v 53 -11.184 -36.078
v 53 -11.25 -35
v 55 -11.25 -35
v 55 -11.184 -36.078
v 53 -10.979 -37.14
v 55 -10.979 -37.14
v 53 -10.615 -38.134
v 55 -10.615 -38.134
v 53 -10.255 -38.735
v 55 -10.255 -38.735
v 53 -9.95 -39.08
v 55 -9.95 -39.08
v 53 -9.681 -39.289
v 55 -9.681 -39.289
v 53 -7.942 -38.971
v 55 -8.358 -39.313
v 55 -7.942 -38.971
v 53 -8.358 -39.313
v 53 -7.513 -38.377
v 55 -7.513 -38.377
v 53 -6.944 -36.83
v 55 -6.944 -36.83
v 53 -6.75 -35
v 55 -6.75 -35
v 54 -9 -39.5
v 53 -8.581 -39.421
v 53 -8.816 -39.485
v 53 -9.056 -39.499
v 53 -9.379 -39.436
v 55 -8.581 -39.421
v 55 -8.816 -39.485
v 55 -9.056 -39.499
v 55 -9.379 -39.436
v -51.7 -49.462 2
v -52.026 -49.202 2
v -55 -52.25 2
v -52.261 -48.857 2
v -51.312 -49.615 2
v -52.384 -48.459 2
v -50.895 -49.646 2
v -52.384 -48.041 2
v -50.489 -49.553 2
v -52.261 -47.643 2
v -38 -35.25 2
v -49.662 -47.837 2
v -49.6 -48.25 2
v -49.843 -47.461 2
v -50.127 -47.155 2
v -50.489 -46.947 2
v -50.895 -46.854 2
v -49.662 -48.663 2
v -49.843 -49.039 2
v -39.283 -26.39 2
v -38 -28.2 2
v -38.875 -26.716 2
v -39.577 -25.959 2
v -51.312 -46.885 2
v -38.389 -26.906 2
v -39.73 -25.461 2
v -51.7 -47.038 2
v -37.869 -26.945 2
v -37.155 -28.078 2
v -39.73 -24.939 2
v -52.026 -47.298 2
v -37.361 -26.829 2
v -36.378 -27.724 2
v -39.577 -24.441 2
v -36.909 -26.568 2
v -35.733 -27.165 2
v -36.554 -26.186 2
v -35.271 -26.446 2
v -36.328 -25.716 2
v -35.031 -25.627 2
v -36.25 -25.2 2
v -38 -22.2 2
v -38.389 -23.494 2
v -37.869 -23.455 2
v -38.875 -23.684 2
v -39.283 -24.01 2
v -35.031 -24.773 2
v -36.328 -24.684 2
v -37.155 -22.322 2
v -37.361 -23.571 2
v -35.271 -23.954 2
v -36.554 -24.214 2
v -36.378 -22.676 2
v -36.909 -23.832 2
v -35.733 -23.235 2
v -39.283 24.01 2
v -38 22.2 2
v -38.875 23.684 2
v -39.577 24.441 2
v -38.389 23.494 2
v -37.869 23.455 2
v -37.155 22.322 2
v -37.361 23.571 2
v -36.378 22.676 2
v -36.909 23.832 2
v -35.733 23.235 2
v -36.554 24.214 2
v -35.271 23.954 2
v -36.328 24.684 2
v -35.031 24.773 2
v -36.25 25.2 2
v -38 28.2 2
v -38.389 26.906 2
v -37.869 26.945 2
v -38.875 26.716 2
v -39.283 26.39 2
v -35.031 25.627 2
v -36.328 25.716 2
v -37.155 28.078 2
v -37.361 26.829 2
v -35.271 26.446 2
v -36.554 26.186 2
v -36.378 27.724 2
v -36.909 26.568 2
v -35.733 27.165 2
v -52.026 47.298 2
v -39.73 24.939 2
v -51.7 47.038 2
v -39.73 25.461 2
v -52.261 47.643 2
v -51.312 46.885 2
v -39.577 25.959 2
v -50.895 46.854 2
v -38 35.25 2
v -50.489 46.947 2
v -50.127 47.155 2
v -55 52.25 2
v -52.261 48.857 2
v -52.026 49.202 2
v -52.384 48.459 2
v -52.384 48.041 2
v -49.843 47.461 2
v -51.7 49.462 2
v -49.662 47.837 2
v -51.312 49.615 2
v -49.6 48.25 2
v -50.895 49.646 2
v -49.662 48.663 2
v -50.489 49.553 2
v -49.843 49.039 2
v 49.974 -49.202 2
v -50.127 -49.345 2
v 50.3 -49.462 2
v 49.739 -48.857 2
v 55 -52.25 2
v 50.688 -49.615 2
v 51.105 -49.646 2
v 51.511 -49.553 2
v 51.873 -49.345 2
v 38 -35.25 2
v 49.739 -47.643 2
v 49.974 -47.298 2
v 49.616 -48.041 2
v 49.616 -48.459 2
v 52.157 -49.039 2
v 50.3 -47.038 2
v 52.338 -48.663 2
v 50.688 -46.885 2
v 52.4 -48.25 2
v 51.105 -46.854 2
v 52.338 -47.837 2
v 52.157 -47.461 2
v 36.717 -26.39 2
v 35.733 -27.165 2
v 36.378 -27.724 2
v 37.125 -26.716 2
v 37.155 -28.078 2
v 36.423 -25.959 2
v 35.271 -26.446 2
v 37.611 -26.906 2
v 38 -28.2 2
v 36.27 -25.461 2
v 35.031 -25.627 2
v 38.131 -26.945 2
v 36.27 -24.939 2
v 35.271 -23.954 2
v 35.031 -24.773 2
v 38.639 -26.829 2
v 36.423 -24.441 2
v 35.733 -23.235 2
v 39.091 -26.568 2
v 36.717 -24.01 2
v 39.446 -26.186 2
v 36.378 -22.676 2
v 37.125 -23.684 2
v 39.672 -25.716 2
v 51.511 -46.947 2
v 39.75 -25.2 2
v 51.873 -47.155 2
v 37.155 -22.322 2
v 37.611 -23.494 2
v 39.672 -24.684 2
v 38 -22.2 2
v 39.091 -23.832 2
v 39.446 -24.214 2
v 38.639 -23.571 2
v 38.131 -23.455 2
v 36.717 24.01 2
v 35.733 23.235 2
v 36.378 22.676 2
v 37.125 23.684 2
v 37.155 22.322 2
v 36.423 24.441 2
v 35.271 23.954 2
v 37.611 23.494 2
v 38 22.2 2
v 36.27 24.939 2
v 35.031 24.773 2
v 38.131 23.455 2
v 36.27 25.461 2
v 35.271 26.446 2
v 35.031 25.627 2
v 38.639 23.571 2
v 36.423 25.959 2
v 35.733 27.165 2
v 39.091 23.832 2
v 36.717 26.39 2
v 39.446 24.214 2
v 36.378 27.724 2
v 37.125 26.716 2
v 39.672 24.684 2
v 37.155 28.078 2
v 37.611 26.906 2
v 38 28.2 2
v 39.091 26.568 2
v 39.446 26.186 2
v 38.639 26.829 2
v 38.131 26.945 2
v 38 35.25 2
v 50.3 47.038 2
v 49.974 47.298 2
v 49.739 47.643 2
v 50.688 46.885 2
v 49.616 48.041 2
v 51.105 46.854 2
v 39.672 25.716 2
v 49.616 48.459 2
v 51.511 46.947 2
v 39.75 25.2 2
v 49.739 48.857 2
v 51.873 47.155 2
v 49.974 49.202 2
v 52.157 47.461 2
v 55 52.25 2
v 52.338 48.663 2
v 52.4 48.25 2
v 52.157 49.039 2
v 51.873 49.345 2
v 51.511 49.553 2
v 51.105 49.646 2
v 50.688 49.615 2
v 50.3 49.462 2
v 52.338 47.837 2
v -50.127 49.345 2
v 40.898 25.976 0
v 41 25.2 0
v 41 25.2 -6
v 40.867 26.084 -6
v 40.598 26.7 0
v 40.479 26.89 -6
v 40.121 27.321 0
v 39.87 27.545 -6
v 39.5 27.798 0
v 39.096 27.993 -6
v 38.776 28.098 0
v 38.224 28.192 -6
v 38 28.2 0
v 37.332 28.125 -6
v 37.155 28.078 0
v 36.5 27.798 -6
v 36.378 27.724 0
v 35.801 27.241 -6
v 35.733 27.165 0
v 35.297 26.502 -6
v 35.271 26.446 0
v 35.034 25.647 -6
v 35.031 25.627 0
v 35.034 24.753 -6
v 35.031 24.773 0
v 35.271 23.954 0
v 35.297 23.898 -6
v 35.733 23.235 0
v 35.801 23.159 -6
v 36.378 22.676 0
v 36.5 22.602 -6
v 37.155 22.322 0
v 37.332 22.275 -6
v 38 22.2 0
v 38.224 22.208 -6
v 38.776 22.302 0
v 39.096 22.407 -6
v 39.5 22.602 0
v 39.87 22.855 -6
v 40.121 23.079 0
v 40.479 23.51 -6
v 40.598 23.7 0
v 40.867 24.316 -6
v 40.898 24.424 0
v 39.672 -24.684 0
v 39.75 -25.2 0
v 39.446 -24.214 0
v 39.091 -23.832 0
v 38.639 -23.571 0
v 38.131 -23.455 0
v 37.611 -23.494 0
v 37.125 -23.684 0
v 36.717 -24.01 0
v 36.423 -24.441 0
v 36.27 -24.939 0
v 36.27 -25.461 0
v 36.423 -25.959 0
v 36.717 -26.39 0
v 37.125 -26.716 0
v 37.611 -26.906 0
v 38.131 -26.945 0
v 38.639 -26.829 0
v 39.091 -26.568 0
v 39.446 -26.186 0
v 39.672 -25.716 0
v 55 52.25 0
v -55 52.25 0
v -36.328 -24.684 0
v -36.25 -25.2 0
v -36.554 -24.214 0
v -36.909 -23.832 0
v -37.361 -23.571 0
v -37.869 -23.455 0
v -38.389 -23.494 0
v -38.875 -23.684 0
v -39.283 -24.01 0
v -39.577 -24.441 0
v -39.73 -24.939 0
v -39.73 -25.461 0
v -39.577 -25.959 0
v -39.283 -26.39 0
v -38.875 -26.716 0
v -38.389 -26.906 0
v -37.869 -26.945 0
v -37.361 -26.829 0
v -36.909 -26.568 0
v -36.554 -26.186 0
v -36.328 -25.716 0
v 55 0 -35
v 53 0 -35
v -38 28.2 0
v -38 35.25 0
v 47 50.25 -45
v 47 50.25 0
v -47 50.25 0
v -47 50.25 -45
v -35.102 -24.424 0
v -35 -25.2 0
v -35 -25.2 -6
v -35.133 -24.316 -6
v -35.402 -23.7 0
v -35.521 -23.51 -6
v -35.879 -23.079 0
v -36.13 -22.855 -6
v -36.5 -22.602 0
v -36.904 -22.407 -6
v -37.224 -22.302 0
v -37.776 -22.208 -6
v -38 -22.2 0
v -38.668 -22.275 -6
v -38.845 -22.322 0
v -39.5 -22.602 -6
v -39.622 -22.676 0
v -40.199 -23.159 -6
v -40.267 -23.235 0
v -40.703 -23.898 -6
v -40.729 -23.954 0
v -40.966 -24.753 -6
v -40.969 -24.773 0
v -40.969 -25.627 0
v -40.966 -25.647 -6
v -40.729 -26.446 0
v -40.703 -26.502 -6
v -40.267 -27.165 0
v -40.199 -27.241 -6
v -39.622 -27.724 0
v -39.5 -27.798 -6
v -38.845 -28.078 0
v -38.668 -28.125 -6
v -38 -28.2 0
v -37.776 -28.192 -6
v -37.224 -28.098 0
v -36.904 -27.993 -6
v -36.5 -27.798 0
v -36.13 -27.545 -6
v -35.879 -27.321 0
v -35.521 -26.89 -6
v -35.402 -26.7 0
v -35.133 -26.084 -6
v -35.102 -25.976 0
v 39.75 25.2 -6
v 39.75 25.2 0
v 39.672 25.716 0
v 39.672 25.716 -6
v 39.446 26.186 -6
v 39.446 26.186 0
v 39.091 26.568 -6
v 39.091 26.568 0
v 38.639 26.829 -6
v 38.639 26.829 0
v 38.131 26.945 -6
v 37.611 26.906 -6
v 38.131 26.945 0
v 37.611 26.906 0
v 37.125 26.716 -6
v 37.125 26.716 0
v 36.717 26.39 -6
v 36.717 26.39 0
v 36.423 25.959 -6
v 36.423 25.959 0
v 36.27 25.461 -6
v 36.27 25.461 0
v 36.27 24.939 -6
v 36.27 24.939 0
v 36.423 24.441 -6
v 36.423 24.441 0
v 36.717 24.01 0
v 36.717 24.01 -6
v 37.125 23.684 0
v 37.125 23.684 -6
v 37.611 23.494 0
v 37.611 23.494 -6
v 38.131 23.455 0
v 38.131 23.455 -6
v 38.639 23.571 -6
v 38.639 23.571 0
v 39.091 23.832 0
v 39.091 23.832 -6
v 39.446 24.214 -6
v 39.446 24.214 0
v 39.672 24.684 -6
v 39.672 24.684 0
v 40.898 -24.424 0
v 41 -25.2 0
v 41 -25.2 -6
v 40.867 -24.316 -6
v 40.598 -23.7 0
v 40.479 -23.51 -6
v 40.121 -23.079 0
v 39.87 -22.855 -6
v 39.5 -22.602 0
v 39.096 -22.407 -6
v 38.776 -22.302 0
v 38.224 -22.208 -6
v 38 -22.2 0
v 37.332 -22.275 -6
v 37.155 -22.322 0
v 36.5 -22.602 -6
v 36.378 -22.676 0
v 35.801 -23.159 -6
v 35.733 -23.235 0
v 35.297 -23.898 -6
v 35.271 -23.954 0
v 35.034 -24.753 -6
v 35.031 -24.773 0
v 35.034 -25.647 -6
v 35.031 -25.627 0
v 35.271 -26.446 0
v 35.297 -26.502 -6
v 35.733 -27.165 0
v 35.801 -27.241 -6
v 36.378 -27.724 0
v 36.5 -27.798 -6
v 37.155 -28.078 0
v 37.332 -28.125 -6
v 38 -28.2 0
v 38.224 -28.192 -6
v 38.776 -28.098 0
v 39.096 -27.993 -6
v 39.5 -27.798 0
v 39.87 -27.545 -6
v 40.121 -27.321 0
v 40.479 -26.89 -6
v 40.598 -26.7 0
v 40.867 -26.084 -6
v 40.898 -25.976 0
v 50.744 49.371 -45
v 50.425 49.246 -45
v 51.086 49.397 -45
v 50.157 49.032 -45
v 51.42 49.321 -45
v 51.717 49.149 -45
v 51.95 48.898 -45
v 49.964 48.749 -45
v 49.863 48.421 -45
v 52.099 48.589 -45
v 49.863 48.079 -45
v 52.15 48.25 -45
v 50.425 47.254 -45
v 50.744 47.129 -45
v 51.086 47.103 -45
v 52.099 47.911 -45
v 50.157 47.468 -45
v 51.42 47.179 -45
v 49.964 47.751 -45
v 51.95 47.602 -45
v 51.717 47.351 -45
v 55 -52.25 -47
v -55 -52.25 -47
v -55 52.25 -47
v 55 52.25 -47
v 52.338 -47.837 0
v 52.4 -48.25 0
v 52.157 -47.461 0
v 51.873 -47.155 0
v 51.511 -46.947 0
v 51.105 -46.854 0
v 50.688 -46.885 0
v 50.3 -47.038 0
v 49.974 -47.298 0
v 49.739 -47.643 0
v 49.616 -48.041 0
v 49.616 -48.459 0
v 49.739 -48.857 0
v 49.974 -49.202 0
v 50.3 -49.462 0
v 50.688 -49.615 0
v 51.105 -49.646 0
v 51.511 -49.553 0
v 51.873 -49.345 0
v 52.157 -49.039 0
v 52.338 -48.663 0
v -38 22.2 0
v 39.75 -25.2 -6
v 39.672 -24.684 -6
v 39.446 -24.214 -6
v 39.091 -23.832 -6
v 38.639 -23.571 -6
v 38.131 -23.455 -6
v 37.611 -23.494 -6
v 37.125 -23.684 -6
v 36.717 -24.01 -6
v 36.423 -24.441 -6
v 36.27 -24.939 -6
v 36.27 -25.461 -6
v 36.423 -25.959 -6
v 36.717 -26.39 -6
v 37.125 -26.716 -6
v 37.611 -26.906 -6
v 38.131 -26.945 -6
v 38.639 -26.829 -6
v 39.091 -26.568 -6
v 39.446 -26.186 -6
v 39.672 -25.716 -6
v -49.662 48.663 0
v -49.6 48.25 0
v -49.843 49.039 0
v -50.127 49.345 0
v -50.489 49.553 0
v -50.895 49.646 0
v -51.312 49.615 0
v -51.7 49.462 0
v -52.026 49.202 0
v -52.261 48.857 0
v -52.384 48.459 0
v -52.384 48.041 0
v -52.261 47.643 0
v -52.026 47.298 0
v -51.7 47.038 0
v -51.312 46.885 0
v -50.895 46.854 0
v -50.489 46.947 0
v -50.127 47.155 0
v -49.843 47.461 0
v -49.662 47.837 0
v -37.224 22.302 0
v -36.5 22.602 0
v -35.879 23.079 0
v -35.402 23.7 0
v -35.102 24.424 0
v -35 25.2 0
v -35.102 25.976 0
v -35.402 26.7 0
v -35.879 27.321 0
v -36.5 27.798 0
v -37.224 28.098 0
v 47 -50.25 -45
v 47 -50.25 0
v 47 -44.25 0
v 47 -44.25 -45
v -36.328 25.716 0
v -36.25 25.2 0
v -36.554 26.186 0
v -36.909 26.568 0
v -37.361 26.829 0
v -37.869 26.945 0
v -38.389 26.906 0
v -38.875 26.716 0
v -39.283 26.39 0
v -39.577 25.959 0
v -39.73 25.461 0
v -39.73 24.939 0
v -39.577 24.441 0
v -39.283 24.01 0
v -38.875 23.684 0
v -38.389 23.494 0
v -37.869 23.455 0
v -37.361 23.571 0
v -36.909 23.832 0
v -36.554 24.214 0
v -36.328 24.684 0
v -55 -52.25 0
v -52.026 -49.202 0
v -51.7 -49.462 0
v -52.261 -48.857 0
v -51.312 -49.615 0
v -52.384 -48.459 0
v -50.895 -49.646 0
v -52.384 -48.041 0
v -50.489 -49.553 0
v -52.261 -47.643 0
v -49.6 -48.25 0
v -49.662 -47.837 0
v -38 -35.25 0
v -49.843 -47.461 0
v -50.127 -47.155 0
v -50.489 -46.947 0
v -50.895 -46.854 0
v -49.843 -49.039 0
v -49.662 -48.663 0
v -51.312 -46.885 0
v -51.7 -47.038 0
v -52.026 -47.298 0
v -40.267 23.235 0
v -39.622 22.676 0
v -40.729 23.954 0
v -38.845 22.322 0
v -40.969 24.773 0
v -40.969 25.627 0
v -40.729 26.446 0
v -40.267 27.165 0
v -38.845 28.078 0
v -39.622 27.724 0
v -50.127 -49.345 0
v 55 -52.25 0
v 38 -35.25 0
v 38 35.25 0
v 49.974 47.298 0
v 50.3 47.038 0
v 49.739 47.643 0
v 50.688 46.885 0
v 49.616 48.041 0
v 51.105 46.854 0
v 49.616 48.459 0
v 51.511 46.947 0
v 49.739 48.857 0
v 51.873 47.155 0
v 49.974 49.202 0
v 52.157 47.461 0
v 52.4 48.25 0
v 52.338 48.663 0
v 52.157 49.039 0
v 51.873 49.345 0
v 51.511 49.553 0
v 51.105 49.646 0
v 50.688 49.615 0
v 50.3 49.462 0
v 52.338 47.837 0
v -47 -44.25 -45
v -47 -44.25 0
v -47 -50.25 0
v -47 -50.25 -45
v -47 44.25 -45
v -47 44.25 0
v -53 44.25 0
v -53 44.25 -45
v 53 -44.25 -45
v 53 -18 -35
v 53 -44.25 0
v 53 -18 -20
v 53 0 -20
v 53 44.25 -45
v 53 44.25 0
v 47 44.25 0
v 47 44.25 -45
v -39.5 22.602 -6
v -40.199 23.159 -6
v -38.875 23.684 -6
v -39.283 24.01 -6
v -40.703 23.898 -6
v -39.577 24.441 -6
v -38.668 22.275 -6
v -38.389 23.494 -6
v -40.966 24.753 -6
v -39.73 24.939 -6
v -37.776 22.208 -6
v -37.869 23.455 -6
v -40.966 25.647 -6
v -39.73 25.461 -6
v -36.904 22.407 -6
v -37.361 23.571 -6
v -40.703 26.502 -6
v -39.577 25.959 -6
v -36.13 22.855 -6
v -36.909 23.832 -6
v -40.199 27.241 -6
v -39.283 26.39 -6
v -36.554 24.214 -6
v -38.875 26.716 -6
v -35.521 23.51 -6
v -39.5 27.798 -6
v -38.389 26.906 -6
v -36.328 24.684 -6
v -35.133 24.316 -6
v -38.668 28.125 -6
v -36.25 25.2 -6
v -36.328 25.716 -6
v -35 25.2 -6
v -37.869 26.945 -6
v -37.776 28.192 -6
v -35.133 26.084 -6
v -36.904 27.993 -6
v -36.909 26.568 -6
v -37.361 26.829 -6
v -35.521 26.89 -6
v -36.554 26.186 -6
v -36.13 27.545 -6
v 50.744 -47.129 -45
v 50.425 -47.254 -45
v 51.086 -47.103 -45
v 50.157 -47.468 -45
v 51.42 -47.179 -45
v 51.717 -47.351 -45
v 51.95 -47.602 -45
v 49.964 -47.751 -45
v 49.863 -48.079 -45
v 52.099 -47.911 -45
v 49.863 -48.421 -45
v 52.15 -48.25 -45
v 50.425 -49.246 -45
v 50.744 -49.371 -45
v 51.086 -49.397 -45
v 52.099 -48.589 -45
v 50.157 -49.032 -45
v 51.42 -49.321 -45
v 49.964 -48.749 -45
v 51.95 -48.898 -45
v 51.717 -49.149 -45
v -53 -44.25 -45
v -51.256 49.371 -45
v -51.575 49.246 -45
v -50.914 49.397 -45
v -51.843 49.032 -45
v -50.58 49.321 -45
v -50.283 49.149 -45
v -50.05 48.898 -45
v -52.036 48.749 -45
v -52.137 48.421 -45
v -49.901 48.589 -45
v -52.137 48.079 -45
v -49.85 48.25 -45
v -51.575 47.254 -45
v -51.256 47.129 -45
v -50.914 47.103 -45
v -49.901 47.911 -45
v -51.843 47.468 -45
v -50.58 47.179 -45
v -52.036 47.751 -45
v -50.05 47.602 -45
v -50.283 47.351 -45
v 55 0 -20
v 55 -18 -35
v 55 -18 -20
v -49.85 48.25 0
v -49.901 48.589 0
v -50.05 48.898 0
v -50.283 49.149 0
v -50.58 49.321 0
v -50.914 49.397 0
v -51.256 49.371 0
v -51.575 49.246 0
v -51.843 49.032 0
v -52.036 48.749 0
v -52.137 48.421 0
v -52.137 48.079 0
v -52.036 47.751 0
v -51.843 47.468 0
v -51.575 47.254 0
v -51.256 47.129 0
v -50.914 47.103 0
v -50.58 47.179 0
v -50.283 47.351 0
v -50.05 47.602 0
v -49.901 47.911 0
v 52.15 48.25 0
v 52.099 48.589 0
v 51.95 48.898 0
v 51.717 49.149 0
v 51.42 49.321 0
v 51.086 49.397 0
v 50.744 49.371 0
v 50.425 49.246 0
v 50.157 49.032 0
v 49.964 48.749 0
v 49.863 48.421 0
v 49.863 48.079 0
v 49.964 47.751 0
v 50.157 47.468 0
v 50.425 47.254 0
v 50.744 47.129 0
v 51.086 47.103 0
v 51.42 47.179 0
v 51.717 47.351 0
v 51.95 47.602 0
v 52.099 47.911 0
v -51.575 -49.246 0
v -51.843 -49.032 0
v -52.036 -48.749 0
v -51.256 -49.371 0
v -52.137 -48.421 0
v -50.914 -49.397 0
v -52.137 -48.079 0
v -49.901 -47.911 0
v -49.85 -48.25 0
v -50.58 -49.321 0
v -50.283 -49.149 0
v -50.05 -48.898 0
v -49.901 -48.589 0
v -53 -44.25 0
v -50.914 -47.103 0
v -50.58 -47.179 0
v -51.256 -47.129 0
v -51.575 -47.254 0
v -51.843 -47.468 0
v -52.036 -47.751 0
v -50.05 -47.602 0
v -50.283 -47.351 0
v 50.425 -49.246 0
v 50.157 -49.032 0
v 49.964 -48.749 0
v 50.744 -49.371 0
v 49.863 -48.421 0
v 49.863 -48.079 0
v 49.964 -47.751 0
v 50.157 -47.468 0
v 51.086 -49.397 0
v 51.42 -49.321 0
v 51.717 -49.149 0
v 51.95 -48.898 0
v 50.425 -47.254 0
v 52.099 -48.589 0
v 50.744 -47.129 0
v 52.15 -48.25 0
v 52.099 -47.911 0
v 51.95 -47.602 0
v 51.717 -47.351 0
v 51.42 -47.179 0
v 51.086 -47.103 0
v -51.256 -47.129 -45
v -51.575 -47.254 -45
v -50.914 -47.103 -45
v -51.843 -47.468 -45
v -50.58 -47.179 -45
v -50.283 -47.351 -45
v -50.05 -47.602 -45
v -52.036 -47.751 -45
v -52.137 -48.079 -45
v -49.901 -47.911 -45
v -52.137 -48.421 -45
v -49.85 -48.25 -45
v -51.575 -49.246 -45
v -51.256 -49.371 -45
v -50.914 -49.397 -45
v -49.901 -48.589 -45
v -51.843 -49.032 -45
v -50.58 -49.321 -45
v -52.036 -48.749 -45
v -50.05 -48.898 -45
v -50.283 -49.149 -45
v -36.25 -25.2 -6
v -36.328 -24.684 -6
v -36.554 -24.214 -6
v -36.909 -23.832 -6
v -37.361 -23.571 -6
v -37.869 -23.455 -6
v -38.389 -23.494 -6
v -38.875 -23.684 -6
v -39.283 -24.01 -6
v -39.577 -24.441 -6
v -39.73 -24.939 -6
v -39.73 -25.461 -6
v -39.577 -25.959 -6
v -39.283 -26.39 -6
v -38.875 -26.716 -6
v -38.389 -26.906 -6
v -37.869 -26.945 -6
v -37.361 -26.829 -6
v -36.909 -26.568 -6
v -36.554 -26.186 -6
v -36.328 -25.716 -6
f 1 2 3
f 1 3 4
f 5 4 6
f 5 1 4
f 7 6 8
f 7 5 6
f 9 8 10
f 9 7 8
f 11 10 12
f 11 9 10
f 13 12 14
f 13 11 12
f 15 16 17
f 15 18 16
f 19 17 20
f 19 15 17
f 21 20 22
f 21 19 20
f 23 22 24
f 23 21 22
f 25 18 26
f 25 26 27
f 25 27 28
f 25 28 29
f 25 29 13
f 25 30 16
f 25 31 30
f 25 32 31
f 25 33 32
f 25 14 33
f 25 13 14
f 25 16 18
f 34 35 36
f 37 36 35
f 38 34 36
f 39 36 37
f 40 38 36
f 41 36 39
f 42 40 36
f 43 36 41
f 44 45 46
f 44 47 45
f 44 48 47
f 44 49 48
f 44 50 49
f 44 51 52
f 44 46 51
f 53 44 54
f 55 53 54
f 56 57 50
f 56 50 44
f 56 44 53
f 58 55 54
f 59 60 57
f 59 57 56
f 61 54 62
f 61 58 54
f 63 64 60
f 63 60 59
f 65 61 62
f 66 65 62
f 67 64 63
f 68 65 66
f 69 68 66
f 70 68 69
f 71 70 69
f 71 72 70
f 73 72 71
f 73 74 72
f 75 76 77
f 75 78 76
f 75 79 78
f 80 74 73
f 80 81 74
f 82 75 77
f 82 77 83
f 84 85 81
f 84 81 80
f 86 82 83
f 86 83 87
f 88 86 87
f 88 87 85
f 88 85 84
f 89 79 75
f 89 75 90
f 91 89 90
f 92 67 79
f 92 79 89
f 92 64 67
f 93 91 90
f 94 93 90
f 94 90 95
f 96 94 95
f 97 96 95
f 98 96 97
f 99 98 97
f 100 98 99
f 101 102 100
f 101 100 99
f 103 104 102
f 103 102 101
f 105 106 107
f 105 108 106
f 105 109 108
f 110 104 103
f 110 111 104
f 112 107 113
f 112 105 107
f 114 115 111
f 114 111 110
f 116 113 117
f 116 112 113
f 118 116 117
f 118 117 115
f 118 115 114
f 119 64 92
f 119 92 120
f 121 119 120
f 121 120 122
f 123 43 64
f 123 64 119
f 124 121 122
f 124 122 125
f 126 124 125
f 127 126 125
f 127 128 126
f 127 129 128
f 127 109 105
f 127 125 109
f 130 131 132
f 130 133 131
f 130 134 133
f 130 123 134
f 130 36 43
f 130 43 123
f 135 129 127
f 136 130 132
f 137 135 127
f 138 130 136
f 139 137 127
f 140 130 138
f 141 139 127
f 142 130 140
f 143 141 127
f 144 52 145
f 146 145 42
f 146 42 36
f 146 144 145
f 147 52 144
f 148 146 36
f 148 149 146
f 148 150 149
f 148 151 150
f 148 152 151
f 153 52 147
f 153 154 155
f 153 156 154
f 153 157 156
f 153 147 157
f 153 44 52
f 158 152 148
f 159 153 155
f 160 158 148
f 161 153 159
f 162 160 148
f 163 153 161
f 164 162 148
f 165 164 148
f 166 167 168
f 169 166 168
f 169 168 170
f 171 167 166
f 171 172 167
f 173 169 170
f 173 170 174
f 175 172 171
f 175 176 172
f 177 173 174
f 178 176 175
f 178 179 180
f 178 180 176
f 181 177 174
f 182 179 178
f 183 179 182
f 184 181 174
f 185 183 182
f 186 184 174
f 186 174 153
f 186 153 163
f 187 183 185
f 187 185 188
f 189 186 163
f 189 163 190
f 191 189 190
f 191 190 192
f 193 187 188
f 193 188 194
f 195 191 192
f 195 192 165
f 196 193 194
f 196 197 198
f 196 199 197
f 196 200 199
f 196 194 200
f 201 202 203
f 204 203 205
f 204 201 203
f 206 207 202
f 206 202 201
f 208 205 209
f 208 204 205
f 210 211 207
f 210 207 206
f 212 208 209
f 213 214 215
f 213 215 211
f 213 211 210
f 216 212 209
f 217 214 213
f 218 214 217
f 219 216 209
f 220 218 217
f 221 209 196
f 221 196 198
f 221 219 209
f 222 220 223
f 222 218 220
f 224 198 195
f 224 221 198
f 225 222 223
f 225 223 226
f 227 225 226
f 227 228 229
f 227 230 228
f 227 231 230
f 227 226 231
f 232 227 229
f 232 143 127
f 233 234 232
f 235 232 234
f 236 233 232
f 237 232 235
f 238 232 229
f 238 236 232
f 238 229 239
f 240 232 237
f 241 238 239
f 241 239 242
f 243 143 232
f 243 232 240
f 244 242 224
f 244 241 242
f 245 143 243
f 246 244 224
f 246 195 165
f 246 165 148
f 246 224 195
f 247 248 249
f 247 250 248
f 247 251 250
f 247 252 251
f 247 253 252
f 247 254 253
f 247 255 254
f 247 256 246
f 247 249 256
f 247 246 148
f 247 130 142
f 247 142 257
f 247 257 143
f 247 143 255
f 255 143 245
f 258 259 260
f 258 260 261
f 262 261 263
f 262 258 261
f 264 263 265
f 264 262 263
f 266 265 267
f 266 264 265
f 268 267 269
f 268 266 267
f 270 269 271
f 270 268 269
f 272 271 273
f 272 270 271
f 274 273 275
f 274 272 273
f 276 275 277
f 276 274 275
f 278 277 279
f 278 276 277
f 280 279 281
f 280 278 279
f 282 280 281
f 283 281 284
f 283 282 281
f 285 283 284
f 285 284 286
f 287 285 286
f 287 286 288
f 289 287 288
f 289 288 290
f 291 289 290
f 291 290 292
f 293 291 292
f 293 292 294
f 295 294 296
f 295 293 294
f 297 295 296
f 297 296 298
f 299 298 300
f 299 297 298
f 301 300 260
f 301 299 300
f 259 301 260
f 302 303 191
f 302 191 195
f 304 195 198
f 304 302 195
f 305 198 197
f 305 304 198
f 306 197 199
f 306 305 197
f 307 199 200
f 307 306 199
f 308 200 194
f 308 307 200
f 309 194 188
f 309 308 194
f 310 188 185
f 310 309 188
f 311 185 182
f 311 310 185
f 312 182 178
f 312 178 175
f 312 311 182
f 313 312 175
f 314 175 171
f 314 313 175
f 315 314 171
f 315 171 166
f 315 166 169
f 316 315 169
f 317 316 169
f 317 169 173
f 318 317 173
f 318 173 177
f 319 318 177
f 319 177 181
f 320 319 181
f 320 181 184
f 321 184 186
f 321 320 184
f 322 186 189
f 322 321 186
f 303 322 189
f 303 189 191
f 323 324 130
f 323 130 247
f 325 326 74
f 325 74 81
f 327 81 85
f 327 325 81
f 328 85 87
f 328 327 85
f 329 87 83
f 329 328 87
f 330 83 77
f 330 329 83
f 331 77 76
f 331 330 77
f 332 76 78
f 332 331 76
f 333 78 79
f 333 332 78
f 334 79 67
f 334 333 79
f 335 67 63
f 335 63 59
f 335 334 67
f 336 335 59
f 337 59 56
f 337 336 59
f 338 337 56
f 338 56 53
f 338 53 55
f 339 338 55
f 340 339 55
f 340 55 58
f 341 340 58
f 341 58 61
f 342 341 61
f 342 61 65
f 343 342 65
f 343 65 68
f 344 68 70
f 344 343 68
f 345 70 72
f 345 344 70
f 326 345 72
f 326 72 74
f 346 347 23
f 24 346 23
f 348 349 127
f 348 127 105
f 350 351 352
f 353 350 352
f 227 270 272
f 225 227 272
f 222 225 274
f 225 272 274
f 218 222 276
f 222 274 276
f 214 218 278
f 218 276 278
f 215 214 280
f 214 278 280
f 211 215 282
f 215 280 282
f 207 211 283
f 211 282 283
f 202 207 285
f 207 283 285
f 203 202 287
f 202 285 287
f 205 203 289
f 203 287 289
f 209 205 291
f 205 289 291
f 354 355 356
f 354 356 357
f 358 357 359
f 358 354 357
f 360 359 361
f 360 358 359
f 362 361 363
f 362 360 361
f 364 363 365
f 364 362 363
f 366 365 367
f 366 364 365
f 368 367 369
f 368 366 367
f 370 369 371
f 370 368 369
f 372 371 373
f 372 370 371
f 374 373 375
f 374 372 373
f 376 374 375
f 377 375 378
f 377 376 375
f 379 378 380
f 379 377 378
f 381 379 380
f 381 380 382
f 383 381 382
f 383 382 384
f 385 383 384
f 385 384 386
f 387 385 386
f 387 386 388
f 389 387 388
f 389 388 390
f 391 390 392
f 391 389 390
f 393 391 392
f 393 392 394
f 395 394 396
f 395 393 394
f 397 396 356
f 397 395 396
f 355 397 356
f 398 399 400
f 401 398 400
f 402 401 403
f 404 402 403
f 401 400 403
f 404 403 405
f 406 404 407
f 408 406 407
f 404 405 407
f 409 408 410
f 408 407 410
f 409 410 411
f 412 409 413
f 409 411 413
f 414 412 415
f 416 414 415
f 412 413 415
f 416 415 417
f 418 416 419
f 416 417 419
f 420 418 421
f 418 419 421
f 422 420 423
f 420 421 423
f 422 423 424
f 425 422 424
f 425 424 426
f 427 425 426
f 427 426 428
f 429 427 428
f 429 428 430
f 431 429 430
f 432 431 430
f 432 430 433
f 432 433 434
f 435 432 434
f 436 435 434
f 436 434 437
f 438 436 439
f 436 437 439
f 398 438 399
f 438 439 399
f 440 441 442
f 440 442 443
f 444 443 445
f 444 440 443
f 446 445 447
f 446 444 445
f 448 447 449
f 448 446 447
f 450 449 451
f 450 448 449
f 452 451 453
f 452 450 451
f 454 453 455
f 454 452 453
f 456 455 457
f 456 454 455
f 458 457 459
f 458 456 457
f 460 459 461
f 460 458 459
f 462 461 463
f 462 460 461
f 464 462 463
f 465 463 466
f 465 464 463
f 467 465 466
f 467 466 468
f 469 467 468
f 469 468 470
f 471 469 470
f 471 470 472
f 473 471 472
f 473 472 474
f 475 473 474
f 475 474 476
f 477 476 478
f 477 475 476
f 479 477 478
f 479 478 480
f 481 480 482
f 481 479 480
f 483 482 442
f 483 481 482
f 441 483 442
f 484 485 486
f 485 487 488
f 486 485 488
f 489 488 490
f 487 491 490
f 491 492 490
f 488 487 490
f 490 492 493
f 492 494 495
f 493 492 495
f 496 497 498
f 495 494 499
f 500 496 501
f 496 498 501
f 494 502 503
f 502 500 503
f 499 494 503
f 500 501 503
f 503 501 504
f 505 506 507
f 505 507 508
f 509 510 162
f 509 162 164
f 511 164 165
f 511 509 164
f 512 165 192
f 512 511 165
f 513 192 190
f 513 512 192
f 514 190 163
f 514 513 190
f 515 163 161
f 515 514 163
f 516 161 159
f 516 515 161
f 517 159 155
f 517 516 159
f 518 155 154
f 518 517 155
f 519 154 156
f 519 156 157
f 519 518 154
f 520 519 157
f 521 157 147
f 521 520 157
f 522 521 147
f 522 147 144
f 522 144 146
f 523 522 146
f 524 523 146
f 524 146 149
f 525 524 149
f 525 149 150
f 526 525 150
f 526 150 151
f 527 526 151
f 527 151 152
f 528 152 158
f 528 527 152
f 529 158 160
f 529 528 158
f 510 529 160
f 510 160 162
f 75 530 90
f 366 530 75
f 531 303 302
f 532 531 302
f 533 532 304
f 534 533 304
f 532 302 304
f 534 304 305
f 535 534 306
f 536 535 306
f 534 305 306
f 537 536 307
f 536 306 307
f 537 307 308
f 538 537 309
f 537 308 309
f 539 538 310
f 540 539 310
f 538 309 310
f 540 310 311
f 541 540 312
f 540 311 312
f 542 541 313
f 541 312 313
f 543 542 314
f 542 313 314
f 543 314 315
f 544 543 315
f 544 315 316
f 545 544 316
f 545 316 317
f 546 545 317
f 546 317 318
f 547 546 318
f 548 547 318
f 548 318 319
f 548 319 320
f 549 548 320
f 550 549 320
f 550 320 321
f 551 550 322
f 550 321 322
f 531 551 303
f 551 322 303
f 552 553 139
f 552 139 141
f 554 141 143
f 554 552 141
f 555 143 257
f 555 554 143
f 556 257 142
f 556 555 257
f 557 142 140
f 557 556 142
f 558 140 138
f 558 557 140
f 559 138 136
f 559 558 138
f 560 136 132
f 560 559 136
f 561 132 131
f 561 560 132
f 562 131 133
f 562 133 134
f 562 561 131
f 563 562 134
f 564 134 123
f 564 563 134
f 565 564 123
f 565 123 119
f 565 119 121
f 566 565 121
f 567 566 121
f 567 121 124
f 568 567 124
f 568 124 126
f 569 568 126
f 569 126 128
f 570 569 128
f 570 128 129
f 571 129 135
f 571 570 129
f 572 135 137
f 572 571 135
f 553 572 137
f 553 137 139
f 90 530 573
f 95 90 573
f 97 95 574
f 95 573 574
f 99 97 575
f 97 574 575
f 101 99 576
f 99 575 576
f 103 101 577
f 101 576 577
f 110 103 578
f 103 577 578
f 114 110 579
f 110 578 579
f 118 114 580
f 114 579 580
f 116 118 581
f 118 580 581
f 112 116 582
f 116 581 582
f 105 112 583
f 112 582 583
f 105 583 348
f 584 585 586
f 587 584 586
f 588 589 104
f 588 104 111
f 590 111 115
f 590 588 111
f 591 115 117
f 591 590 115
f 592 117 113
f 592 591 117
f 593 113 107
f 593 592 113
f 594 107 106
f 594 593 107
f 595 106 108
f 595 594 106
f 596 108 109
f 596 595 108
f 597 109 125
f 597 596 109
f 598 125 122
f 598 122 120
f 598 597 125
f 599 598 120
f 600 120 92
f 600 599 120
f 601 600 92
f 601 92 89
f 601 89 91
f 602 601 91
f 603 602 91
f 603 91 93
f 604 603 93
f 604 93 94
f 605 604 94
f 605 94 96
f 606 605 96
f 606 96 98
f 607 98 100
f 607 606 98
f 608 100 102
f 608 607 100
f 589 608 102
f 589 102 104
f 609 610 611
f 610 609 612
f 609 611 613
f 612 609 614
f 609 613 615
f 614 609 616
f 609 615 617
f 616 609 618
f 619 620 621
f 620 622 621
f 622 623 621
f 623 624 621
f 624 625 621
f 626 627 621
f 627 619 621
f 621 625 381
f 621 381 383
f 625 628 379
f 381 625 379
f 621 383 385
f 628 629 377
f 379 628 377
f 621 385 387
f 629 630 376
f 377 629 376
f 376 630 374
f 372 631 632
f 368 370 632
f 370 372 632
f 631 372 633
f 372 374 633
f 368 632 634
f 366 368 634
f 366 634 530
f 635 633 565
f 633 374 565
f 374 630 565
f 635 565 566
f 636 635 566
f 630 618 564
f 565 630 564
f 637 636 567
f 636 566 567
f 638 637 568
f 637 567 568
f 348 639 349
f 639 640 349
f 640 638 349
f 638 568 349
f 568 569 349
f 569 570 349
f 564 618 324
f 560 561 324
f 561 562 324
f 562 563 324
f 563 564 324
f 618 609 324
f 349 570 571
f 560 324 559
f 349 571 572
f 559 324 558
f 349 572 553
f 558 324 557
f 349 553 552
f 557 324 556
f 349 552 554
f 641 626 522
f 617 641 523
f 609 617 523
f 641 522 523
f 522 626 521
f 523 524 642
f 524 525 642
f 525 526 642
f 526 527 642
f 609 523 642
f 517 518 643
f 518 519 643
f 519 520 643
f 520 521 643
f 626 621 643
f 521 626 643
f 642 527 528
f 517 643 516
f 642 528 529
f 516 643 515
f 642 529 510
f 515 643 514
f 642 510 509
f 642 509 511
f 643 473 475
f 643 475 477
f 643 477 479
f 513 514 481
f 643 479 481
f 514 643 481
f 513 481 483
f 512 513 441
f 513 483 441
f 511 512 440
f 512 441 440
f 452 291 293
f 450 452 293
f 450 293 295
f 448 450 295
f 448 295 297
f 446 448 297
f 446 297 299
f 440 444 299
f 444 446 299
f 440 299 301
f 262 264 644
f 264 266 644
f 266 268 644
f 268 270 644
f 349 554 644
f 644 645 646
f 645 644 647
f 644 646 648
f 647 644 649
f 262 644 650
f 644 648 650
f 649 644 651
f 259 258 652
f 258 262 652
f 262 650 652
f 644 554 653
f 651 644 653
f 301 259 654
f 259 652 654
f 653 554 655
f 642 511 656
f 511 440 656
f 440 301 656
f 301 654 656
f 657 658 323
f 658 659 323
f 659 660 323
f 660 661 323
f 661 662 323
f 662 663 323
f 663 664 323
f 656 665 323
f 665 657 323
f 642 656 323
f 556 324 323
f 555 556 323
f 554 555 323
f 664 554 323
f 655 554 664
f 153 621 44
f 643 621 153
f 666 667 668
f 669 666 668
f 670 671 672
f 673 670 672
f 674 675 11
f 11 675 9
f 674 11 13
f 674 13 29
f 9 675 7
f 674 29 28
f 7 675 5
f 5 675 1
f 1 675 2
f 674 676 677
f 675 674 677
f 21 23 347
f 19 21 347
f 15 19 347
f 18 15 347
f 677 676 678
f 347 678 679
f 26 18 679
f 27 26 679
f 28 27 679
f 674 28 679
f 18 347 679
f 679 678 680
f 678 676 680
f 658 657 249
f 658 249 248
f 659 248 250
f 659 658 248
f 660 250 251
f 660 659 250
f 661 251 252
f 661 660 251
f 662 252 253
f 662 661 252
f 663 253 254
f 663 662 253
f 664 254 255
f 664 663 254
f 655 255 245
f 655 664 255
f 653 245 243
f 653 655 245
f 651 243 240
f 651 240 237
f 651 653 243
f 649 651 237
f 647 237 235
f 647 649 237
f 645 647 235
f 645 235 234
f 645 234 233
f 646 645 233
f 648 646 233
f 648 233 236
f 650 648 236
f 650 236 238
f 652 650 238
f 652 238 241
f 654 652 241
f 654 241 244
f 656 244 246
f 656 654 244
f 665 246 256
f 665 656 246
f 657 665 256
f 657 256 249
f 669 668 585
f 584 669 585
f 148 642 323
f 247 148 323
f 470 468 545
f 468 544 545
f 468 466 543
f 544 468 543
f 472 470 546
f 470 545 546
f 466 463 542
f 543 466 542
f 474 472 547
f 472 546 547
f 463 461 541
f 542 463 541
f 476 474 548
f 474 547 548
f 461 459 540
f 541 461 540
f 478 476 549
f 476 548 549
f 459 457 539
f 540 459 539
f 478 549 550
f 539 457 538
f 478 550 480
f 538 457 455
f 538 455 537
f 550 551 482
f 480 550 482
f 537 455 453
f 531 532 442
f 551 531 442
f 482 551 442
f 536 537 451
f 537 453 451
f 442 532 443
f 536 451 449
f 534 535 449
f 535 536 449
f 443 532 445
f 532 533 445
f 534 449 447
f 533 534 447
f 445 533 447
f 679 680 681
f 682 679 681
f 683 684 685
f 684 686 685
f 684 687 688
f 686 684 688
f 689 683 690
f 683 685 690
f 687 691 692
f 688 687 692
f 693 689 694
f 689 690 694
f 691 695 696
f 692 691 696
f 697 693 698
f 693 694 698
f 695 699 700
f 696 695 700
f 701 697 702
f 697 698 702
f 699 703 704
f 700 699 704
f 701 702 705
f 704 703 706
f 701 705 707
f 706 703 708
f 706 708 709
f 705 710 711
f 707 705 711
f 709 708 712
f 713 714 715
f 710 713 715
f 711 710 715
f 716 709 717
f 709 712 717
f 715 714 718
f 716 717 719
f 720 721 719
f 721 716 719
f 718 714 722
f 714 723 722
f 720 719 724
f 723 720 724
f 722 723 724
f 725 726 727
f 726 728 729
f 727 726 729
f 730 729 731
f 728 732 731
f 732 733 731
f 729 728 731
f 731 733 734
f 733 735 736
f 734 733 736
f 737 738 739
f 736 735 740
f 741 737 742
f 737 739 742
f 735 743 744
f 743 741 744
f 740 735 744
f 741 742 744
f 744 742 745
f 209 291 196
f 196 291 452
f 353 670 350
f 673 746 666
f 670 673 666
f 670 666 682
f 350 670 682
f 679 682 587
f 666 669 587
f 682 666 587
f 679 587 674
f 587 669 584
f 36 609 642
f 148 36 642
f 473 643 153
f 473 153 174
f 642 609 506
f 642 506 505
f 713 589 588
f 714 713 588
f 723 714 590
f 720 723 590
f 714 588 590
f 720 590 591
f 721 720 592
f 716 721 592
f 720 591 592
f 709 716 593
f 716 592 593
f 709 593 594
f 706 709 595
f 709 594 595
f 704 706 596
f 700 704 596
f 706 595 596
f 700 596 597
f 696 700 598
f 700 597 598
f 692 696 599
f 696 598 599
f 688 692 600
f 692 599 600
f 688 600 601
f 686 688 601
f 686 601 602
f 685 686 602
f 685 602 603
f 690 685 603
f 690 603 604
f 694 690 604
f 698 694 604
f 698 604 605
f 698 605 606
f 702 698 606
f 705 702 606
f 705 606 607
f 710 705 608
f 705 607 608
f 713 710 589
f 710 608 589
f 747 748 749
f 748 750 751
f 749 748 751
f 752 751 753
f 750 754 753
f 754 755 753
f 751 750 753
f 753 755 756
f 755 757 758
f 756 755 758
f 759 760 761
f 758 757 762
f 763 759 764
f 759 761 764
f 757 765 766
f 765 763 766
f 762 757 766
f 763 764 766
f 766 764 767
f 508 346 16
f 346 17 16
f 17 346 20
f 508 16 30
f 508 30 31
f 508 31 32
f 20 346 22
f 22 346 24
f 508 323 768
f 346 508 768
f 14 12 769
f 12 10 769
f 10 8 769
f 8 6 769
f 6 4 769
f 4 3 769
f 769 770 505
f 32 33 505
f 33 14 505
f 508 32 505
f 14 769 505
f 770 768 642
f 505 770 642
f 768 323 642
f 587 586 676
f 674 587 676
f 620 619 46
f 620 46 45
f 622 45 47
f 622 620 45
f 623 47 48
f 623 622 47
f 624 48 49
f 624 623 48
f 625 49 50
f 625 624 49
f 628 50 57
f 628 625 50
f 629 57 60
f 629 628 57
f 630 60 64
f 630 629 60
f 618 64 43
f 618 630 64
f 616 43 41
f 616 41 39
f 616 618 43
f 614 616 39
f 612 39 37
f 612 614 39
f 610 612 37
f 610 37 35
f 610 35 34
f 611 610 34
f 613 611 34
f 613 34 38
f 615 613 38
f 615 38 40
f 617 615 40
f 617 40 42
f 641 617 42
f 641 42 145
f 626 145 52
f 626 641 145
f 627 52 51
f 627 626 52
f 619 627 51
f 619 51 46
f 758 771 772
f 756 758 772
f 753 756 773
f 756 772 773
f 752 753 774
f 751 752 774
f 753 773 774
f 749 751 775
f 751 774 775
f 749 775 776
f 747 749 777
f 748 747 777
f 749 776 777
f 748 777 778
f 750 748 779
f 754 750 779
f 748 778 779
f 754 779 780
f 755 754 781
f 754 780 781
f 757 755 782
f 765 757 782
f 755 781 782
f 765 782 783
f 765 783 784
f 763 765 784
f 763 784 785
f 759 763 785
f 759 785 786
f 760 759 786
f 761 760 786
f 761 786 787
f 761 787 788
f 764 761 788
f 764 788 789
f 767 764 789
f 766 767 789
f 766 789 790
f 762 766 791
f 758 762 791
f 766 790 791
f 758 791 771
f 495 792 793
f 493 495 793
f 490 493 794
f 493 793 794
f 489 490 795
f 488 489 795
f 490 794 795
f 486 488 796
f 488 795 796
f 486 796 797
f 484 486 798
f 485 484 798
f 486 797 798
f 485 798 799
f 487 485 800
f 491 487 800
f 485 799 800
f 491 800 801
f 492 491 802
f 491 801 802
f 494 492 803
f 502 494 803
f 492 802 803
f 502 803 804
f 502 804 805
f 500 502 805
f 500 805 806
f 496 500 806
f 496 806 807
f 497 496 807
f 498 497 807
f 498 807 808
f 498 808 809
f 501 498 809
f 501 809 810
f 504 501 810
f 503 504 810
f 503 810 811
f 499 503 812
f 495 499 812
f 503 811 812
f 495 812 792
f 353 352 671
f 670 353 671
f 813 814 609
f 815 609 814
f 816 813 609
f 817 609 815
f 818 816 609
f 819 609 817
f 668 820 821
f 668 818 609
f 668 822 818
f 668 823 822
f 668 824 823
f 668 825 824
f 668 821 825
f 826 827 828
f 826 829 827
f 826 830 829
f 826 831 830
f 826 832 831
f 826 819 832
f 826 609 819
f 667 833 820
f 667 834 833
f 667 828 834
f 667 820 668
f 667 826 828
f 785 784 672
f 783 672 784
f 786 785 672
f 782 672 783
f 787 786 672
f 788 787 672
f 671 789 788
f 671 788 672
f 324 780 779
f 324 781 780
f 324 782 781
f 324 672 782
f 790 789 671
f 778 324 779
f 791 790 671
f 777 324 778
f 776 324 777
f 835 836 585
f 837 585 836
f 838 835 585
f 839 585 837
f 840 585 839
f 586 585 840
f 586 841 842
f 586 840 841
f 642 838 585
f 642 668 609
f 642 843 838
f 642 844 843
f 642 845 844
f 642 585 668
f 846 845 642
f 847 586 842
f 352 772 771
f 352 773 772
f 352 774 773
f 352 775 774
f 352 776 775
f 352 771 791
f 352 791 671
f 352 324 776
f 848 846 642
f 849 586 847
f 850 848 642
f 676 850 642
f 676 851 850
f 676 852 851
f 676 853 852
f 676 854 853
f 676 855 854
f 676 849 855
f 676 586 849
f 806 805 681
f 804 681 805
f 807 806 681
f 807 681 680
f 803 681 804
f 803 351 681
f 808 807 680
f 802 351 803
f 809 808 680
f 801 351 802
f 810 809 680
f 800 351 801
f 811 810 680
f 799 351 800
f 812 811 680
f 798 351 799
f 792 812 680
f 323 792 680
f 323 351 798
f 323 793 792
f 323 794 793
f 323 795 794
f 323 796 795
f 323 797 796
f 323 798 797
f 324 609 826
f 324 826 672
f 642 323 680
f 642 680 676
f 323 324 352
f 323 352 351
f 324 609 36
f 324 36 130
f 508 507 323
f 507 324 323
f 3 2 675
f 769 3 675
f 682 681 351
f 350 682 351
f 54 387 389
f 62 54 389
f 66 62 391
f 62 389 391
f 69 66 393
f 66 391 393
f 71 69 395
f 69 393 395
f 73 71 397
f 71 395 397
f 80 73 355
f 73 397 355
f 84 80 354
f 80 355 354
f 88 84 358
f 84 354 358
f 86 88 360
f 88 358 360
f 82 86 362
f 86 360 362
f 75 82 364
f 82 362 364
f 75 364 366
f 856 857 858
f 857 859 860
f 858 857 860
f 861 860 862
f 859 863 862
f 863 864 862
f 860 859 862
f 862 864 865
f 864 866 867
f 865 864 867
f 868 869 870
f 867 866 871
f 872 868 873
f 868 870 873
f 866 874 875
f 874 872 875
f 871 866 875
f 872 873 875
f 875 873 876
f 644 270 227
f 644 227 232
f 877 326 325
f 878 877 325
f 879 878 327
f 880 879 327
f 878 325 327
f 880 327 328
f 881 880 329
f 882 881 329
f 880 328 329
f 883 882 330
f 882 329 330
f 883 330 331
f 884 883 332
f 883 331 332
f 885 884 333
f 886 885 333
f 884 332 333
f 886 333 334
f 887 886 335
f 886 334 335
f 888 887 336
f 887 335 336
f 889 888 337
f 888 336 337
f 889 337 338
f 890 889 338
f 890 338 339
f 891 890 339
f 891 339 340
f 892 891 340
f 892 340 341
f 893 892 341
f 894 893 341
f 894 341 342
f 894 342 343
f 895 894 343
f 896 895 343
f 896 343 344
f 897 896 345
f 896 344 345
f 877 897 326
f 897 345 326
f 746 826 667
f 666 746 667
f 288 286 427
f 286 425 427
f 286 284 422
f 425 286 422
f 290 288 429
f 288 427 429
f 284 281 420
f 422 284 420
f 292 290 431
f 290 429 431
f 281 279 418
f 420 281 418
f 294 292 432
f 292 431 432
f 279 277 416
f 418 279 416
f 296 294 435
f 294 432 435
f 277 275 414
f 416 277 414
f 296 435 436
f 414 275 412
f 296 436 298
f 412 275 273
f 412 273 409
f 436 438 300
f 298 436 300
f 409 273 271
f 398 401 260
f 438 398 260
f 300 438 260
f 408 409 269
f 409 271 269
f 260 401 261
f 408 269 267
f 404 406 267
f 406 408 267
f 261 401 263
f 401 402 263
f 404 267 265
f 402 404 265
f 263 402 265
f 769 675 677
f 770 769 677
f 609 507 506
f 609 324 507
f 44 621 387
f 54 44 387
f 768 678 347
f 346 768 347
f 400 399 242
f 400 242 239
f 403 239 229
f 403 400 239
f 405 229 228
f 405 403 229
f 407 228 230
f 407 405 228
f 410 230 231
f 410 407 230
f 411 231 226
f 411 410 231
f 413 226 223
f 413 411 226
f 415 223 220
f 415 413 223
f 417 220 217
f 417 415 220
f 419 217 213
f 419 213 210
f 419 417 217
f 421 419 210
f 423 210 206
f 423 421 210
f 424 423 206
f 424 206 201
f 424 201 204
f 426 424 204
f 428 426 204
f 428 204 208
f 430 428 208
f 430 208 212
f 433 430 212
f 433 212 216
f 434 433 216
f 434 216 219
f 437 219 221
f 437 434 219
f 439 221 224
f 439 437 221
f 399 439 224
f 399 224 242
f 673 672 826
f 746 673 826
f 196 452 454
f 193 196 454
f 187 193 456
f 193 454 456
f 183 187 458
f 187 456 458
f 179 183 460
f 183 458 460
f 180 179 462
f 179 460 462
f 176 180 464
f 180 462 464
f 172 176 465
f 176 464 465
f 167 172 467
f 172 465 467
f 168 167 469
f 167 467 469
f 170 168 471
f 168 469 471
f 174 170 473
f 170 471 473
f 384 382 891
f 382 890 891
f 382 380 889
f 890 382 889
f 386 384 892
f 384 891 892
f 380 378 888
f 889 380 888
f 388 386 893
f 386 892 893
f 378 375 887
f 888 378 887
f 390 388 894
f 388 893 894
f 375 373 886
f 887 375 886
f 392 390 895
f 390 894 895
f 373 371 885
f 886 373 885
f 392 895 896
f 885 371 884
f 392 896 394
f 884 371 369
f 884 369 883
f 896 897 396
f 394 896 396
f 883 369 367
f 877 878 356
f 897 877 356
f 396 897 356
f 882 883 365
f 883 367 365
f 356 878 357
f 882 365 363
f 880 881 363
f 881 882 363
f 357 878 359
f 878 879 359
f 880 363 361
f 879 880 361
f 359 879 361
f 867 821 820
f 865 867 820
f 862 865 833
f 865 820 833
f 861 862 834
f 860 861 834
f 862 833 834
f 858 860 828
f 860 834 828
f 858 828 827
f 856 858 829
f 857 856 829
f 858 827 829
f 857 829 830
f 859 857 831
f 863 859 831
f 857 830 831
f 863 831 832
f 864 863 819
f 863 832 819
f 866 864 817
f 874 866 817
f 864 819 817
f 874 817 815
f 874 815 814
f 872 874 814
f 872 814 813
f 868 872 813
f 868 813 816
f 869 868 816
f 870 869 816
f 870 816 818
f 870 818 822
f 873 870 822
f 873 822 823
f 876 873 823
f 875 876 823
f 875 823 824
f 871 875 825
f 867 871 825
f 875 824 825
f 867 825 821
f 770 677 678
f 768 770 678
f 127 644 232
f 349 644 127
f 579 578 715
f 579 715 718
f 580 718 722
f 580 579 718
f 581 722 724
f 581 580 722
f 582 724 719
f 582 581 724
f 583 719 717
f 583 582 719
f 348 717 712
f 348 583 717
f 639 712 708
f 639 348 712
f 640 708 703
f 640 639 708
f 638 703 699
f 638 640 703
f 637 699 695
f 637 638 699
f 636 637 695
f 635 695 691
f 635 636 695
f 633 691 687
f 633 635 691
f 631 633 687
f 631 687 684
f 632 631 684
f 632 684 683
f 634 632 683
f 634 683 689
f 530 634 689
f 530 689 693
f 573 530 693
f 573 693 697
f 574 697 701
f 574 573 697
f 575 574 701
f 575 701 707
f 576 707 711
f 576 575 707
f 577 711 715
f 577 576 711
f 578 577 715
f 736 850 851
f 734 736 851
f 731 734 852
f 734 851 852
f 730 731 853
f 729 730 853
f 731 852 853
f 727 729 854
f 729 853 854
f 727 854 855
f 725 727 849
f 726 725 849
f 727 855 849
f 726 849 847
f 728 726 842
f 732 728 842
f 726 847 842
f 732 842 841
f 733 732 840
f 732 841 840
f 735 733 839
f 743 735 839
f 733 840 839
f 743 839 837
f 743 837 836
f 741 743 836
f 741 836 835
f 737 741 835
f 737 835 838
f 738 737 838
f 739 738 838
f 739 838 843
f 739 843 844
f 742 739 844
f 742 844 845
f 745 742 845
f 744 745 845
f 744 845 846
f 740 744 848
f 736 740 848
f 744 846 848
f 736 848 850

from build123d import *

# Parameters (mm, degrees)
SKETCH_W      = 110
SKETCH_H      = 104.5
SKETCH_R      = 1.75
SKETCH_R_2    = 1.4
PAD_DEPTH     = 2
SKETCH001_R   = 3
SKETCH001_R_2 = 1.75
PAD001_DEPTH  = 6
SKETCH002_W   = 110
SKETCH002_H   = 104.5
SKETCH002_R   = 1.15
PAD002_DEPTH  = 45
SKETCH003_W   = 110
SKETCH003_H   = 104.5
PAD003_DEPTH  = 2
POCKET_DEPTH  = 55.001


with BuildPart() as faceplate:
    # Sketch → Pad (new body)
    with BuildSketch(Plane.XY):
        Rectangle(SKETCH_W, SKETCH_H)
        with Locations((-38, 25.2)):
            Circle(SKETCH_R, mode=Mode.SUBTRACT)
        with Locations((38, 25.2)):
            Circle(SKETCH_R, mode=Mode.SUBTRACT)
        with Locations((-38, -25.2)):
            Circle(SKETCH_R, mode=Mode.SUBTRACT)
        with Locations((38, -25.2)):
            Circle(SKETCH_R, mode=Mode.SUBTRACT)
        with Locations((-51, 48.25)):
            Circle(SKETCH_R_2, mode=Mode.SUBTRACT)
        with Locations((51, 48.25)):
            Circle(SKETCH_R_2, mode=Mode.SUBTRACT)
        with Locations((-51, -48.25)):
            Circle(SKETCH_R_2, mode=Mode.SUBTRACT)
        with Locations((51, -48.25)):
            Circle(SKETCH_R_2, mode=Mode.SUBTRACT)
        with BuildLine():
            Line((38, 28.2), (38, 35.25))
            Line((38, 35.25), (-38, 35.25))
            Line((-38, 35.25), (-38, 28.2))
            ThreePointArc((-38, 22.2), (-35, 25.2), (-38, 28.2))
            Line((-38, 22.2), (-38, -22.2))
            ThreePointArc((-38, -28.2), (-35, -25.2), (-38, -22.2))
            Line((-38, -35.25), (-38, -28.2))
            Line((-38, -35.25), (38, -35.25))
            Line((38, -35.25), (38, -28.2))
            ThreePointArc((38, -22.2), (35, -25.2), (38, -28.2))
            Line((38, 22.2), (38, -22.2))
            ThreePointArc((38, 28.2), (35, 25.2), (38, 22.2))
        make_face(mode=Mode.SUBTRACT)
    extrude(amount=PAD_DEPTH)

    # Sketch001 → Pad001 (join)
    with BuildSketch(Plane.XY):
        with Locations((-38, 25.2)):
            Circle(SKETCH001_R)
        with Locations((-38, 25.2)):
            Circle(SKETCH001_R_2, mode=Mode.SUBTRACT)
        with Locations((38, -25.2)):
            Circle(SKETCH001_R)
        with Locations((38, -25.2)):
            Circle(SKETCH001_R_2, mode=Mode.SUBTRACT)
        with Locations((-38, -25.2)):
            Circle(SKETCH001_R)
        with Locations((-38, -25.2)):
            Circle(SKETCH001_R_2, mode=Mode.SUBTRACT)
        with Locations((38, 25.2)):
            Circle(SKETCH001_R)
        with Locations((38, 25.2)):
            Circle(SKETCH001_R_2, mode=Mode.SUBTRACT)
    extrude(amount=-PAD001_DEPTH)


with BuildPart() as box:
    # Sketch002 → Pad002 (new body)
    with BuildSketch(Plane.XY):
        Rectangle(SKETCH002_W, SKETCH002_H)
        with Locations((-51, 48.25)):
            Circle(SKETCH002_R, mode=Mode.SUBTRACT)
        with Locations((-51, -48.25)):
            Circle(SKETCH002_R, mode=Mode.SUBTRACT)
        with Locations((51, -48.25)):
            Circle(SKETCH002_R, mode=Mode.SUBTRACT)
        with Locations((51, 48.25)):
            Circle(SKETCH002_R, mode=Mode.SUBTRACT)
        Polygon((47, 50.25), (-47, 50.25), (-47, 44.25), (-53, 44.25), (-53, -44.25), (-47, -44.25), (-47, -50.25), (47, -50.25), (47, -44.25), (53, -44.25), (53, 44.25), (47, 44.25), align=None, mode=Mode.SUBTRACT)
    extrude(amount=-PAD002_DEPTH)

    # Sketch003 (on Face22 of Pad002) → Pad003 (join)
    with BuildSketch(Plane(origin=(0, 0, -45), x_dir=(1, 0, 0), z_dir=(0, 0, -1))):
        Rectangle(SKETCH003_W, SKETCH003_H)
    extrude(amount=PAD003_DEPTH)

    # Sketch004 → Pocket (cut, through all)
    with BuildSketch(Plane.YZ):
        with BuildLine():
            Line((-18, -20), (0, -20))
            Line((0, -20), (0, -35))
            Line((0, -35), (-6.75, -35))
            add(Edge.make_bspline(
                [(-11.25, -35), (-11.25, -39.5), (-9, -39.5), (-6.75, -39.5), (-6.75, -35)],
                knots=[1.570796, 1.570796, 1.570796, 3.141593, 3.141593, 4.712389, 4.712389, 4.712389], degree=2, weights=[1, 0.707107, 1, 0.707107, 1]))
            Line((-11.25, -35), (-18, -35))
            Line((-18, -35), (-18, -20))
        make_face()
    extrude(amount=POCKET_DEPTH, mode=Mode.SUBTRACT)


solid = Compound([faceplate.part, box.part])
